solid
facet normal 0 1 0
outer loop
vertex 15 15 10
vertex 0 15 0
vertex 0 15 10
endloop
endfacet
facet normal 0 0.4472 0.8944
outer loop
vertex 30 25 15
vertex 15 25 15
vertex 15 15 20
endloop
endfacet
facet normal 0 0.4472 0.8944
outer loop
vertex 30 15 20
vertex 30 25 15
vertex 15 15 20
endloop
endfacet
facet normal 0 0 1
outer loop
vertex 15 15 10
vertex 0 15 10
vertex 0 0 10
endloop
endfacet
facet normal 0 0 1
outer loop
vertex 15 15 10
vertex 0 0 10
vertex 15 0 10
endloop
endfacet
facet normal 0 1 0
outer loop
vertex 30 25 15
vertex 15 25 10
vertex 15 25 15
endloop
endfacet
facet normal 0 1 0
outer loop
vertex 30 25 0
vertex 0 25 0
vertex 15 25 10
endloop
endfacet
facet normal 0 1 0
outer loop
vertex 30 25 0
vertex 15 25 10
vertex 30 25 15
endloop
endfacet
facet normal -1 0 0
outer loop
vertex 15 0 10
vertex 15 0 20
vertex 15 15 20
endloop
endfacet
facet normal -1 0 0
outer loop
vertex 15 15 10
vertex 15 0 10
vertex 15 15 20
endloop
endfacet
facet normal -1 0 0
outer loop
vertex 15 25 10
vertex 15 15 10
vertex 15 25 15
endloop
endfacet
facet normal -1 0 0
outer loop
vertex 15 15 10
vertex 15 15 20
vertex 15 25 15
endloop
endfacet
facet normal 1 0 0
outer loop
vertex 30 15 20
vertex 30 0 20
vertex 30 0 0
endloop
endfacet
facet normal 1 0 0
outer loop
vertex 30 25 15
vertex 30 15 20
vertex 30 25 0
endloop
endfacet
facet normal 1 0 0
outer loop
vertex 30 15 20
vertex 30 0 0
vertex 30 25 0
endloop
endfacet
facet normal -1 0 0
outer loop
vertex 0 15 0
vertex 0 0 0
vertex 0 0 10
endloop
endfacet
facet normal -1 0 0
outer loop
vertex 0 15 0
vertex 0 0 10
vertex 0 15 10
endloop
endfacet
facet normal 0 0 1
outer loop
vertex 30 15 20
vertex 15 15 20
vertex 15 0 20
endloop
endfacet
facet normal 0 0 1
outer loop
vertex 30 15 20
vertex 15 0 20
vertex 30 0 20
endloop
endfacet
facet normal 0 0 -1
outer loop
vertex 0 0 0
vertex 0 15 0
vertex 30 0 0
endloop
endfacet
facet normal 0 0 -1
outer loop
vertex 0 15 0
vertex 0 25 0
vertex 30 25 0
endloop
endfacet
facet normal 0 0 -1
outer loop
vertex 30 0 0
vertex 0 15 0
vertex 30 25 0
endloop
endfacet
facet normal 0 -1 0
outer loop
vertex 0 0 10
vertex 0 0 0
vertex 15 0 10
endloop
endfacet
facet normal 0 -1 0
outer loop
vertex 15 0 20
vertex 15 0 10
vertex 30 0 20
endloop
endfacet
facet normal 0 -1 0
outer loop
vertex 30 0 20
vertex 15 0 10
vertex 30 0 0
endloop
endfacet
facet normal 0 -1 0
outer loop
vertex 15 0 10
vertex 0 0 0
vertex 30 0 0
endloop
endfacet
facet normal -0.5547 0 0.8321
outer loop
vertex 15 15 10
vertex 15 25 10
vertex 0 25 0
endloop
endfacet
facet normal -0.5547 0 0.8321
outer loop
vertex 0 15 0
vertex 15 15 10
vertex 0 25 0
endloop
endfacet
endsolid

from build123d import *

# Parameters (mm, degrees)
SKETCH1_W           = 30
SKETCH1_H           = 25
BOSS_EXTRUDE1_DEPTH = 20
SKETCH2_W           = 15
SKETCH2_H           = 25
CUT_EXTRUDE1_DEPTH  = 10
CUT_EXTRUDE2_DEPTH  = 20
CUT_EXTRUDE3_DEPTH  = 10


with BuildPart() as part:
    # Sketch1 → Boss-Extrude1 (new body)
    with BuildSketch(Plane.XY):
        with Locations((15, 12.5)):
            Rectangle(SKETCH1_W, SKETCH1_H)
    extrude(amount=BOSS_EXTRUDE1_DEPTH)

    # Sketch2 → Cut-Extrude1 (cut)
    with BuildSketch(Plane.XY.offset(20)):
        with Locations((7.5, 12.5)):
            Rectangle(SKETCH2_W, SKETCH2_H)
    extrude(amount=-CUT_EXTRUDE1_DEPTH, mode=Mode.SUBTRACT)

    # Sketch3 → Cut-Extrude2 (cut)
    with BuildSketch(Plane.ZY.offset(-15)):
        Polygon((15, 25), (20, 15), (20, 25), align=None)
    extrude(amount=-CUT_EXTRUDE2_DEPTH, mode=Mode.SUBTRACT)

    # Sketch4 → Cut-Extrude3 (cut)
    with BuildSketch(Plane(origin=(0, 25, 0), x_dir=(1, 0, 0), z_dir=(0, 1, 0))):
        Polygon((15, -10), (0, 0), (0, -10), align=None)
    extrude(amount=-CUT_EXTRUDE3_DEPTH, mode=Mode.SUBTRACT)


solid = part.part
